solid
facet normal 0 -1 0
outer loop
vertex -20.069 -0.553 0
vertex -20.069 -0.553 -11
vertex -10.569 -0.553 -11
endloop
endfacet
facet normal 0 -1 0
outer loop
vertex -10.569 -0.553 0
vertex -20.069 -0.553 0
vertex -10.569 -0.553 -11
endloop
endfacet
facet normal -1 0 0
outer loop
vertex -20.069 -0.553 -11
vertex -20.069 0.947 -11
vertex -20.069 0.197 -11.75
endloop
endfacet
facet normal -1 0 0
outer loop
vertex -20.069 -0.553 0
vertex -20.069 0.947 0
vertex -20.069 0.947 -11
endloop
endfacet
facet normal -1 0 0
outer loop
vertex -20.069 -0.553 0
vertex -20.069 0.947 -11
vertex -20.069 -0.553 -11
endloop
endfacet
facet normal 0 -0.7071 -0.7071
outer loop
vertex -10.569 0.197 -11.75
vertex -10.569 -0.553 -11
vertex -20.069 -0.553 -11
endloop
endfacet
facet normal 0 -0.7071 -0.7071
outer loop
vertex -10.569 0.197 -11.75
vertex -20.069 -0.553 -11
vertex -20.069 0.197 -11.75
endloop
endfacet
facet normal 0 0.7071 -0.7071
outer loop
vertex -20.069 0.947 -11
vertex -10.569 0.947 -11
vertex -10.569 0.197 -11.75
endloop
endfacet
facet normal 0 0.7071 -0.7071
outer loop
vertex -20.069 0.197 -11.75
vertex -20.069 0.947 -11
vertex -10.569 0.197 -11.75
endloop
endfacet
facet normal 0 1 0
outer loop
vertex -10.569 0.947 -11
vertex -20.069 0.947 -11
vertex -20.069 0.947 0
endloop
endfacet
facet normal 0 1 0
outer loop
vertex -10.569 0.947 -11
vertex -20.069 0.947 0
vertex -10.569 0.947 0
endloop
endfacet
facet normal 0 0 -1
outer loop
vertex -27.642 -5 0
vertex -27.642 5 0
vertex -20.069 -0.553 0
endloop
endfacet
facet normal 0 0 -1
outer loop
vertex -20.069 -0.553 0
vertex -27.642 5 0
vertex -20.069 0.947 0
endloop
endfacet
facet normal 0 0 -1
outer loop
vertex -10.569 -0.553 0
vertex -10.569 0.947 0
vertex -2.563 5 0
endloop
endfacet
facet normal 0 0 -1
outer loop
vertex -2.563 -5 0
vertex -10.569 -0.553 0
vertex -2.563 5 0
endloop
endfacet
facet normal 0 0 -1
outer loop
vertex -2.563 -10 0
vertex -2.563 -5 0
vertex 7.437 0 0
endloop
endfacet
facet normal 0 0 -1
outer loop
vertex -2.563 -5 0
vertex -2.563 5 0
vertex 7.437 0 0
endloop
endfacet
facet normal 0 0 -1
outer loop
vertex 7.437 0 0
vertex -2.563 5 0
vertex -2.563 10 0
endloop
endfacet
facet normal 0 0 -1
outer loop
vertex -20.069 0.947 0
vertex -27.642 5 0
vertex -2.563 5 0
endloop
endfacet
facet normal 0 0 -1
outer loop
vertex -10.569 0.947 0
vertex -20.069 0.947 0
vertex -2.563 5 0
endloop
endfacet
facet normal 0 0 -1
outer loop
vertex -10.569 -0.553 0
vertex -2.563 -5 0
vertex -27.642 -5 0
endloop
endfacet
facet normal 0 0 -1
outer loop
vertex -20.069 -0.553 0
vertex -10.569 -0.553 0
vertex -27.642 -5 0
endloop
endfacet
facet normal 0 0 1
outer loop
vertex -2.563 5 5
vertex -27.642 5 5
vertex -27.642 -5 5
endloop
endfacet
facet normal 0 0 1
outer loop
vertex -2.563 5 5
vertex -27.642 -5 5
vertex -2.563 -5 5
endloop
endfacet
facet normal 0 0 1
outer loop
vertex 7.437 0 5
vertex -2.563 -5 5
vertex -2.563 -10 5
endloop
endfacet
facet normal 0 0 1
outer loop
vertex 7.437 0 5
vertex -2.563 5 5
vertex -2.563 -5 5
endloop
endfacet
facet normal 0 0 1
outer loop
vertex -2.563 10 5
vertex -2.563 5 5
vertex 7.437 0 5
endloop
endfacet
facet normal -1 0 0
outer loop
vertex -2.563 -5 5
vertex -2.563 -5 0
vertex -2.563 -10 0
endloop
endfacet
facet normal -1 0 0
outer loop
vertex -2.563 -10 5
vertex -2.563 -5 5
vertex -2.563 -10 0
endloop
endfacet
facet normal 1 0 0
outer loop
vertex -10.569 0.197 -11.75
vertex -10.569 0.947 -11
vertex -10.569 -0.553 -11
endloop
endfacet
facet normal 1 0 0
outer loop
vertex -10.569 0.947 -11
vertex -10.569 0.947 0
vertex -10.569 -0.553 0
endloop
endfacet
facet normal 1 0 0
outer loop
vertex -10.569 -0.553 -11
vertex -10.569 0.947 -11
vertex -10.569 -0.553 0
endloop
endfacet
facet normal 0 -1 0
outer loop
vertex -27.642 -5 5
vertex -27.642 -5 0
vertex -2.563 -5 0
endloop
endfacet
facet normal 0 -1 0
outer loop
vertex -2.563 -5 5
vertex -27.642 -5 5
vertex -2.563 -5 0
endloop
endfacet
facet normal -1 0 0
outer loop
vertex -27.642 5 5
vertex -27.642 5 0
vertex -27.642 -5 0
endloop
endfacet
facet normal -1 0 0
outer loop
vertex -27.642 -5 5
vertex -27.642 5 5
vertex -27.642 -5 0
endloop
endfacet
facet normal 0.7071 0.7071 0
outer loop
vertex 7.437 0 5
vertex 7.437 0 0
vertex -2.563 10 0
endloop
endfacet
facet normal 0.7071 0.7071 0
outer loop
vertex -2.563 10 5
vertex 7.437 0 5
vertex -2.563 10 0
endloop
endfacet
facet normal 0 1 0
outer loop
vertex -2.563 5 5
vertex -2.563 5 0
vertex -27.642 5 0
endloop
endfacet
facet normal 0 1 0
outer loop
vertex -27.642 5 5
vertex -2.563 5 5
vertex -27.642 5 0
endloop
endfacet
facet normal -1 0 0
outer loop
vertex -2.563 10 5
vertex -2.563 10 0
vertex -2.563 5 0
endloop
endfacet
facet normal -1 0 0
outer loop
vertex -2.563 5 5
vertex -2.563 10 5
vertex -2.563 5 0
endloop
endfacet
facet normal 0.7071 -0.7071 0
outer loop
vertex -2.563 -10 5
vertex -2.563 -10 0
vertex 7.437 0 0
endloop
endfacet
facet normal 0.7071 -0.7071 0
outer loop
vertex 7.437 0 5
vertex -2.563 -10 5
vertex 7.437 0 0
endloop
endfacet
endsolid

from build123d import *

# Parameters (mm, degrees)
F1_DEPTH    = 5
F2_W        = 9.5
F2_H        = 1.5
F3_DEPTH    = 12
F4_T1_DEPTH = 14.6433659759


# Not quite as in the source:
# - a fillet or chamfer that OpenCascade refuses, or shapes differently, is made with other operations: its cross-section is extruded or revolved along the edge and cut away or added


with BuildPart() as f1:
    # F0 (on Top) → F1 (new body)
    with BuildSketch(Plane.XY):
        Polygon((-2.5628354418, 5), (-27.6419919184, 5), (-27.6419919184, -5), (-2.5628354418, -5), (-2.5628354418, -10), (7.4371645582, 0), (-2.5628354418, 10), align=None)
    extrude(amount=F1_DEPTH)

    # F2 (on face) → F3 (join)
    with BuildSketch(Plane(origin=(0, 0, 0), x_dir=(1, 0, 0), z_dir=(0, 0, -1))):
        with Locations((-15.3186318129, -0.1973686223)):
            Rectangle(F2_W, F2_H)
    extrude(amount=F3_DEPTH)

    # F4: chamfer of 1 on 2 edges, made by hand

    # F4_s2 → F4_t1 (cut)
    with BuildSketch(Plane.YZ.offset(-22.6403148009)):
        Polygon((0.9473686223, -11), (-0.0526313777, -12), (0.9473686223, -12), align=None)
        Polygon((-0.5526313777, -11), (0.4473686223, -12), (-0.5526313777, -12), align=None)
    extrude(amount=F4_T1_DEPTH, mode=Mode.SUBTRACT)


solid = f1.part
